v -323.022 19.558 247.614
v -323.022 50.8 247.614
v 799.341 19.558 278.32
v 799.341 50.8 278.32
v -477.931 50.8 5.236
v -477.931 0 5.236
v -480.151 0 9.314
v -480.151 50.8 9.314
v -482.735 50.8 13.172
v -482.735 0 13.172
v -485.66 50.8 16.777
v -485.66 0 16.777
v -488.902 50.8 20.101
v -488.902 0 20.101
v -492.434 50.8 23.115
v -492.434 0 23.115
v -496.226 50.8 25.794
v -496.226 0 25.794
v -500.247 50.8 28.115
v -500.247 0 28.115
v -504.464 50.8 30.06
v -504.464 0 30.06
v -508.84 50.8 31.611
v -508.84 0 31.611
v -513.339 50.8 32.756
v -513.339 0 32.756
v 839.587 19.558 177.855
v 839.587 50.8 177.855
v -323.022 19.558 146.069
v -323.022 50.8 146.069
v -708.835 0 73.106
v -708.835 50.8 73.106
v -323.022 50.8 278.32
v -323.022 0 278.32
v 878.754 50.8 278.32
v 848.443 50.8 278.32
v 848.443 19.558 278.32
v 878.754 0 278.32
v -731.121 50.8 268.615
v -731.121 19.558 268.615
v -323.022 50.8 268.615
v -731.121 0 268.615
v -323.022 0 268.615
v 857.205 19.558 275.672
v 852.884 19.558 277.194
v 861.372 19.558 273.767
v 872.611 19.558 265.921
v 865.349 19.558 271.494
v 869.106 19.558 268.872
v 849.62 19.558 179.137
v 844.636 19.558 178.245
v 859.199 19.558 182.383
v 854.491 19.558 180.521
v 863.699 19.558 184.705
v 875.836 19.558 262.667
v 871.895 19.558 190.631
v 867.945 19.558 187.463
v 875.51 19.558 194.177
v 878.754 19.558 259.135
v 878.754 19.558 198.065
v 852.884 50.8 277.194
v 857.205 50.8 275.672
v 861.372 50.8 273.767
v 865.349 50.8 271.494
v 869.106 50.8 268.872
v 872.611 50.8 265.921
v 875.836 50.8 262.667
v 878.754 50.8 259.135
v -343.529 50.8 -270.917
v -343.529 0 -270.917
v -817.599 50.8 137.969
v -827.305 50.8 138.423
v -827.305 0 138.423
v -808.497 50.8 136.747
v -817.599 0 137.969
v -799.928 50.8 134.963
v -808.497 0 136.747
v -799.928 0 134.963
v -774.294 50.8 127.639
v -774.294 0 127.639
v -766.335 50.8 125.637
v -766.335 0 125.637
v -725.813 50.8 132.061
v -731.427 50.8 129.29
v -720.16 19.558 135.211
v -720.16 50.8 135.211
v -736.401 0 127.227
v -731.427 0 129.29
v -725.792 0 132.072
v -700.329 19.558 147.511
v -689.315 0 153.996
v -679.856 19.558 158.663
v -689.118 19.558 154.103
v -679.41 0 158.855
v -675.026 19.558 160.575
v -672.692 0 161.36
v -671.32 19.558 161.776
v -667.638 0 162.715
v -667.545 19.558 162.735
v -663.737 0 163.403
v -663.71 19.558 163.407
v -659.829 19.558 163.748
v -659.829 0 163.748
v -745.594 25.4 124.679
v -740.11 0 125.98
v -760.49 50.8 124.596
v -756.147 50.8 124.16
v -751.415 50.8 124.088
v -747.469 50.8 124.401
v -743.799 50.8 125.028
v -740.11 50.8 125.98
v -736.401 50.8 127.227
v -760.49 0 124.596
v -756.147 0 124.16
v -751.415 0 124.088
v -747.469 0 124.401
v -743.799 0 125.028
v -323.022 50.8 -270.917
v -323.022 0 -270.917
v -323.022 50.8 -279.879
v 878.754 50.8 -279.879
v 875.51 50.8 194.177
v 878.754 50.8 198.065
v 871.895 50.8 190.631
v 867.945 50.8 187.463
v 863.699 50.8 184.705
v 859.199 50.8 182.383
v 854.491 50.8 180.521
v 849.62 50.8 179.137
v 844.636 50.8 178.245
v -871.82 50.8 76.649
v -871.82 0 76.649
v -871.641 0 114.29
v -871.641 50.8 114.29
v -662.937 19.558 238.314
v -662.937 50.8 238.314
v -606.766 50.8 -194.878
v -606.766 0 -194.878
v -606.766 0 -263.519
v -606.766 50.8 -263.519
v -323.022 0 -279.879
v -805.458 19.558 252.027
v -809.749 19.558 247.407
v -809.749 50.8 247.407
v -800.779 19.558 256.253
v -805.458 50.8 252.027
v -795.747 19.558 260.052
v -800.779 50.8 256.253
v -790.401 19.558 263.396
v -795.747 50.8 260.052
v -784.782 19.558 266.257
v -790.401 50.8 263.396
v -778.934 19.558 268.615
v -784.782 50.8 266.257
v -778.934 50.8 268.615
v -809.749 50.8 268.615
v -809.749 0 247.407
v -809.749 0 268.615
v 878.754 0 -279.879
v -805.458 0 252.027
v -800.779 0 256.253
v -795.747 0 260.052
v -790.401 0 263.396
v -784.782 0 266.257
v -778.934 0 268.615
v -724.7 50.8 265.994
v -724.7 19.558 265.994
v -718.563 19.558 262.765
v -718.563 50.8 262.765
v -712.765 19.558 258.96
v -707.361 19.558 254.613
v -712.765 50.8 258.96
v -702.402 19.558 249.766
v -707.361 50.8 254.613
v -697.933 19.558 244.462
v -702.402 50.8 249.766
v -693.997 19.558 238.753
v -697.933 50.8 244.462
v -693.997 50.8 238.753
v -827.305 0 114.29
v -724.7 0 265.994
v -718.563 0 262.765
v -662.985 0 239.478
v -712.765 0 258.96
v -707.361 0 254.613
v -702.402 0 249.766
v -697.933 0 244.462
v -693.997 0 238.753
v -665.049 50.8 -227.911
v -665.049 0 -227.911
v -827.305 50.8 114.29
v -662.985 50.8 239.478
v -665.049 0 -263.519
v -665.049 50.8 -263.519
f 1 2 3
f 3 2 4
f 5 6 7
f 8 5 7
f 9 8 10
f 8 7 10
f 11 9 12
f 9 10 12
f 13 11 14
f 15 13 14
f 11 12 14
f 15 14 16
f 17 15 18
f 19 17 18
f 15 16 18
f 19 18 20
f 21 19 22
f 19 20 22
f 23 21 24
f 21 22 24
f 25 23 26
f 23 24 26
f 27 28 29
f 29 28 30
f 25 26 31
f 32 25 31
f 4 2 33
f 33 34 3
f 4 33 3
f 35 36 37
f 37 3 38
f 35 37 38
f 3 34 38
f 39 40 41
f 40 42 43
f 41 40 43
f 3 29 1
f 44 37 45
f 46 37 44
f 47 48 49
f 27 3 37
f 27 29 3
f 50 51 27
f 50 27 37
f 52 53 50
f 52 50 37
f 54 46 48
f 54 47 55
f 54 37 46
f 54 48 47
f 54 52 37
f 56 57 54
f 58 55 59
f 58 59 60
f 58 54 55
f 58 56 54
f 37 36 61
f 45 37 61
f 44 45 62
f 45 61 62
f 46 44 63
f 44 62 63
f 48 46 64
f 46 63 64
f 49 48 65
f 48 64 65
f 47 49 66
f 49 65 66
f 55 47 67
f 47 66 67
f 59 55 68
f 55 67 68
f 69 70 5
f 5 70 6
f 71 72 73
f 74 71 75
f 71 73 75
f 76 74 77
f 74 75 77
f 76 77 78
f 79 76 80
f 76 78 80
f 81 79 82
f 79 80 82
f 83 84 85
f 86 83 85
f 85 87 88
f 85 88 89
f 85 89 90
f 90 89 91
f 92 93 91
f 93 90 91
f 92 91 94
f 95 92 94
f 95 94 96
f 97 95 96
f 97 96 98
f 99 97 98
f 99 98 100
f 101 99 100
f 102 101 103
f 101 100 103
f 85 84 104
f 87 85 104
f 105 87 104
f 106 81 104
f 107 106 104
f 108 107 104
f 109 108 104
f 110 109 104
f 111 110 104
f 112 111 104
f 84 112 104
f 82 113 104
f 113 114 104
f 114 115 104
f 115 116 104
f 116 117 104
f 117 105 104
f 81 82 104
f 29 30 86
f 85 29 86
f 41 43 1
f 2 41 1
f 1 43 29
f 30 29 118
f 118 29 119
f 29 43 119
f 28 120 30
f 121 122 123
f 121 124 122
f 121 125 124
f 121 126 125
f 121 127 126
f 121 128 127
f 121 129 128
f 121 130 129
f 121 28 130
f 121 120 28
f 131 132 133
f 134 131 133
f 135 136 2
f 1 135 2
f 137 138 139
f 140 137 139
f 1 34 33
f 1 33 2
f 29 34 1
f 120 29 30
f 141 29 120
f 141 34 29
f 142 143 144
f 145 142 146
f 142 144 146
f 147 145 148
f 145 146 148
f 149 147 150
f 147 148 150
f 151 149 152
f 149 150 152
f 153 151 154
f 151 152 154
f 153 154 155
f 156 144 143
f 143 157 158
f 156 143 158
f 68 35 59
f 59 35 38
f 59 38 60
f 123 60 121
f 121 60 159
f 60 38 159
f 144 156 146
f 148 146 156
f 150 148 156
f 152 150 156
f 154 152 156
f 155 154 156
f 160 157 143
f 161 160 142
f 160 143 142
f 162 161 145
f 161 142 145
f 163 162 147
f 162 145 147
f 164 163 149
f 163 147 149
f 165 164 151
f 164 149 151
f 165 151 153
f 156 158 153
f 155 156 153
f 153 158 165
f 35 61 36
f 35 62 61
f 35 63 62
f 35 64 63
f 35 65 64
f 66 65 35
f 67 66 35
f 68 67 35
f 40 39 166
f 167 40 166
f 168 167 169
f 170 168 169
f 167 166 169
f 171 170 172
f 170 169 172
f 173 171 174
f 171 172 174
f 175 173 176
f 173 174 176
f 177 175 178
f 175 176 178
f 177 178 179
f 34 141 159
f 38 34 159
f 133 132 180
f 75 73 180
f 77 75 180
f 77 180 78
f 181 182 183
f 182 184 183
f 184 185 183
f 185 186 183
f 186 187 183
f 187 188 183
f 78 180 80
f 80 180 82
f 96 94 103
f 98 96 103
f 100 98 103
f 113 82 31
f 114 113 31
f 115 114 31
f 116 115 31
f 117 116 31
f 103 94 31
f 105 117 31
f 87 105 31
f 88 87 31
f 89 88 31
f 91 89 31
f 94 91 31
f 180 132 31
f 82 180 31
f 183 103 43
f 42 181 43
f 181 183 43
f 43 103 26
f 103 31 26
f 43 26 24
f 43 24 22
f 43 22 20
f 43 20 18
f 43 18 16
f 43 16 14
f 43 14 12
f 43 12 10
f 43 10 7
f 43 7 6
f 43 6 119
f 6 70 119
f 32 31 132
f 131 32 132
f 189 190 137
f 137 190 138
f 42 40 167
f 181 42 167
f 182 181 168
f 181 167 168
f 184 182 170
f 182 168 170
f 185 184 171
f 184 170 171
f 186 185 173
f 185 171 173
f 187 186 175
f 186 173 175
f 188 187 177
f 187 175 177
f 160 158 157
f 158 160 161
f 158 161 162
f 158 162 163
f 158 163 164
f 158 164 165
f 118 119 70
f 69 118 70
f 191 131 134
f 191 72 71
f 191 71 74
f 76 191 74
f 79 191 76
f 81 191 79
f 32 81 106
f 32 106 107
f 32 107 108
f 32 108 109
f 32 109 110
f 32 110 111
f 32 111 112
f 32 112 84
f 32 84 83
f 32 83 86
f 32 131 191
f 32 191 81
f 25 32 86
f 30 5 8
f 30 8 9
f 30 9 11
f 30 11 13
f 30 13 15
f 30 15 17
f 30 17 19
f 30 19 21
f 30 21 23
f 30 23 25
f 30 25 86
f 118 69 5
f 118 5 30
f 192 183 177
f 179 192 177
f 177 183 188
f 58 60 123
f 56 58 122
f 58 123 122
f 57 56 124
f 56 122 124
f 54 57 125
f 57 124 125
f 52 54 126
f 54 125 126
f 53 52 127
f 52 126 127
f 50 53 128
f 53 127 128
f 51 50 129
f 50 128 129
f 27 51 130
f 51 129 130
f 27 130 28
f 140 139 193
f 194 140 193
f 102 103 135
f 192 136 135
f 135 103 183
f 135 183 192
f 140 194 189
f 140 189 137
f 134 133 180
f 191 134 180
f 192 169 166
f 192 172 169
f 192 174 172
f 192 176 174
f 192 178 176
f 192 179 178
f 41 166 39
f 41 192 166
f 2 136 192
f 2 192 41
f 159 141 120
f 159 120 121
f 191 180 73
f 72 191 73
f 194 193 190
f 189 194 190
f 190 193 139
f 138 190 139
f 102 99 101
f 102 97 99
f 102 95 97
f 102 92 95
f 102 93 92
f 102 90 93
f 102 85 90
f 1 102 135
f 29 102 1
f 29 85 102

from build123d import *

# Parameters (mm, degrees)
BOSS_EXTRUDE1_DEPTH   = 50.8
BOSS_EXTRUDE1_2_DEPTH = 50.8
SKETCH2_W             = 1201.775932767
SKETCH2_H             = 558.199404441
BOSS_EXTRUDE2_DEPTH   = 50.8
CUT_EXTRUDE1_START    = 50.8
CUT_EXTRUDE1_DEPTH    = 31.242
CUT_EXTRUDE2_DEPTH    = 34.544


with BuildPart() as part:
    # Sketch1 → Boss-Extrude1 (new body)
    with BuildSketch(Plane(origin=(0, 0, 0), x_dir=(1, 0, 0), z_dir=(0, 1, 0))):
        with BuildLine():
            Line((-871.820440323, -76.649300831), (-871.641101875, -114.290321726))
            Line((-871.641101875, -114.290321726), (-827.305117277, -114.290321726))
            Line((-827.305117277, -114.290321726), (-827.305117277, -138.423193725))
            add(Edge.make_bspline(
                [(-827.305117277, -138.423193725), (-792.273117361, -138.423193725), (-743.797362049, -100.228210329), (-689.293747089, -162.520410056), (-659.829397565, -163.748236388)],
                knots=[0, 0, 0, 0, 0.467854577, 1, 1, 1, 1], degree=3))
            Line((-659.829397565, -163.748236388), (-662.985161767, -239.477626694))
            Line((-662.985161767, -239.477626694), (-809.749405531, -236.047842805))
            Line((-809.749405531, -236.047842805), (-809.749405531, -268.614984646))
            Line((-809.749405531, -268.614984646), (-323.022309341, -268.614984646))
            Line((-323.022309341, -268.614984646), (-323.022309341, 270.917349392))
            Line((-323.022309341, 270.917349392), (-343.528617531, 270.917349392))
            Line((-343.528617531, 270.917349392), (-477.930602029, -5.236006151))
            ThreePointArc((-477.930602029, -5.236006151), (-492.433794564, -23.115048161), (-513.339441144, -32.756452519))
            Line((-513.339441144, -32.756452519), (-708.834673801, -73.106313327))
            Line((-708.834673801, -73.106313327), (-871.820440323, -76.649300831))
        make_face()
    extrude(amount=BOSS_EXTRUDE1_DEPTH)


with BuildPart() as body_2:
    # Sketch1 → Boss-Extrude1 2 (new body)
    with BuildSketch(Plane(origin=(0, 0, 0), x_dir=(1, 0, 0), z_dir=(0, 1, 0))):
        Polygon((-606.766159206, 194.877712853), (-606.766159206, 263.51884305), (-665.048893777, 263.51884305), (-665.048893777, 227.910987393), align=None)
    extrude(amount=BOSS_EXTRUDE1_2_DEPTH)


with BuildPart() as body_3:
    # Sketch2 → Boss-Extrude2 (new body)
    with BuildSketch(Plane(origin=(0, 0, 0), x_dir=(1, 0, 0), z_dir=(0, 1, 0))):
        with Locations((277.865657043, 0.779686246)):
            Rectangle(SKETCH2_W, SKETCH2_H)
    extrude(amount=BOSS_EXTRUDE2_DEPTH)


with BuildPart() as cut_extrude1_tool:
    # Sketch4 → Cut-Extrude1 (new body)
    with BuildSketch(Plane(origin=(0, 0, 0), x_dir=(1, 0, 0), z_dir=(0, 1, 0)).offset(CUT_EXTRUDE1_START)):
        with BuildLine():
            Line((839.587388975, -177.854835662), (-780.072920894, -133.572806287))
            ThreePointArc((-780.072920894, -133.572806287), (-810.137959334, -246.945720049), (-693.228451964, -237.485741316))
            Line((-693.228451964, -237.485741316), (836.811695918, -279.34513931))
            ThreePointArc((836.811695918, -279.34513931), (888.945151826, -229.987846529), (839.587388975, -177.854835662))
        make_face()
    extrude(amount=-CUT_EXTRUDE1_DEPTH)


with BuildPart() as part_1:
    add(part.part)

    # Cut-Extrude1: cut by cut_extrude1_tool
    add(cut_extrude1_tool.part, mode=Mode.SUBTRACT)

    # Sketch5 → Cut-Extrude2 (cut)
    with BuildSketch(Plane(origin=(0, 19.558, 0), x_dir=(1, 0, 0), z_dir=(0, 1, 0))):
        with BuildLine():
            Line((-809.749405531, -236.047842805), (-809.749405531, -247.406694678))
            ThreePointArc((-809.749405531, -247.406694678), (-795.746664079, -260.052308022), (-778.933904815, -268.614984646))
            Line((-778.933904815, -268.614984646), (-731.120835745, -268.614984646))
            ThreePointArc((-731.120835745, -268.614984646), (-710.010484249, -256.851914378), (-693.996654331, -238.752908501))
            Line((-693.996654331, -238.752908501), (-809.749405531, -236.047842805))
        make_face()
    extrude(amount=-CUT_EXTRUDE2_DEPTH, mode=Mode.SUBTRACT)


with BuildPart() as body_3_1:
    add(body_3.part)

    # Cut-Extrude1: cut by cut_extrude1_tool
    add(cut_extrude1_tool.part, mode=Mode.SUBTRACT)


with BuildPart() as cut_extrude2_piece_1:
    # of the separate pieces the step leaves, piece 1, a body of its own (cut_extrude2_pieces)
    add(part_1.part.solids().sort_by_distance((-871.820440323, 0, 76.649300831))[0])


with BuildPart() as cut_extrude2_piece_2:
    # of the separate pieces the step leaves, piece 2, a body of its own (cut_extrude2_pieces)
    add(part_1.part.solids().sort_by_distance((-809.749405531, 0, 247.406694678))[0])


solid = Compound([body_2.part, body_3_1.part, cut_extrude2_piece_1.part, cut_extrude2_piece_2.part])
